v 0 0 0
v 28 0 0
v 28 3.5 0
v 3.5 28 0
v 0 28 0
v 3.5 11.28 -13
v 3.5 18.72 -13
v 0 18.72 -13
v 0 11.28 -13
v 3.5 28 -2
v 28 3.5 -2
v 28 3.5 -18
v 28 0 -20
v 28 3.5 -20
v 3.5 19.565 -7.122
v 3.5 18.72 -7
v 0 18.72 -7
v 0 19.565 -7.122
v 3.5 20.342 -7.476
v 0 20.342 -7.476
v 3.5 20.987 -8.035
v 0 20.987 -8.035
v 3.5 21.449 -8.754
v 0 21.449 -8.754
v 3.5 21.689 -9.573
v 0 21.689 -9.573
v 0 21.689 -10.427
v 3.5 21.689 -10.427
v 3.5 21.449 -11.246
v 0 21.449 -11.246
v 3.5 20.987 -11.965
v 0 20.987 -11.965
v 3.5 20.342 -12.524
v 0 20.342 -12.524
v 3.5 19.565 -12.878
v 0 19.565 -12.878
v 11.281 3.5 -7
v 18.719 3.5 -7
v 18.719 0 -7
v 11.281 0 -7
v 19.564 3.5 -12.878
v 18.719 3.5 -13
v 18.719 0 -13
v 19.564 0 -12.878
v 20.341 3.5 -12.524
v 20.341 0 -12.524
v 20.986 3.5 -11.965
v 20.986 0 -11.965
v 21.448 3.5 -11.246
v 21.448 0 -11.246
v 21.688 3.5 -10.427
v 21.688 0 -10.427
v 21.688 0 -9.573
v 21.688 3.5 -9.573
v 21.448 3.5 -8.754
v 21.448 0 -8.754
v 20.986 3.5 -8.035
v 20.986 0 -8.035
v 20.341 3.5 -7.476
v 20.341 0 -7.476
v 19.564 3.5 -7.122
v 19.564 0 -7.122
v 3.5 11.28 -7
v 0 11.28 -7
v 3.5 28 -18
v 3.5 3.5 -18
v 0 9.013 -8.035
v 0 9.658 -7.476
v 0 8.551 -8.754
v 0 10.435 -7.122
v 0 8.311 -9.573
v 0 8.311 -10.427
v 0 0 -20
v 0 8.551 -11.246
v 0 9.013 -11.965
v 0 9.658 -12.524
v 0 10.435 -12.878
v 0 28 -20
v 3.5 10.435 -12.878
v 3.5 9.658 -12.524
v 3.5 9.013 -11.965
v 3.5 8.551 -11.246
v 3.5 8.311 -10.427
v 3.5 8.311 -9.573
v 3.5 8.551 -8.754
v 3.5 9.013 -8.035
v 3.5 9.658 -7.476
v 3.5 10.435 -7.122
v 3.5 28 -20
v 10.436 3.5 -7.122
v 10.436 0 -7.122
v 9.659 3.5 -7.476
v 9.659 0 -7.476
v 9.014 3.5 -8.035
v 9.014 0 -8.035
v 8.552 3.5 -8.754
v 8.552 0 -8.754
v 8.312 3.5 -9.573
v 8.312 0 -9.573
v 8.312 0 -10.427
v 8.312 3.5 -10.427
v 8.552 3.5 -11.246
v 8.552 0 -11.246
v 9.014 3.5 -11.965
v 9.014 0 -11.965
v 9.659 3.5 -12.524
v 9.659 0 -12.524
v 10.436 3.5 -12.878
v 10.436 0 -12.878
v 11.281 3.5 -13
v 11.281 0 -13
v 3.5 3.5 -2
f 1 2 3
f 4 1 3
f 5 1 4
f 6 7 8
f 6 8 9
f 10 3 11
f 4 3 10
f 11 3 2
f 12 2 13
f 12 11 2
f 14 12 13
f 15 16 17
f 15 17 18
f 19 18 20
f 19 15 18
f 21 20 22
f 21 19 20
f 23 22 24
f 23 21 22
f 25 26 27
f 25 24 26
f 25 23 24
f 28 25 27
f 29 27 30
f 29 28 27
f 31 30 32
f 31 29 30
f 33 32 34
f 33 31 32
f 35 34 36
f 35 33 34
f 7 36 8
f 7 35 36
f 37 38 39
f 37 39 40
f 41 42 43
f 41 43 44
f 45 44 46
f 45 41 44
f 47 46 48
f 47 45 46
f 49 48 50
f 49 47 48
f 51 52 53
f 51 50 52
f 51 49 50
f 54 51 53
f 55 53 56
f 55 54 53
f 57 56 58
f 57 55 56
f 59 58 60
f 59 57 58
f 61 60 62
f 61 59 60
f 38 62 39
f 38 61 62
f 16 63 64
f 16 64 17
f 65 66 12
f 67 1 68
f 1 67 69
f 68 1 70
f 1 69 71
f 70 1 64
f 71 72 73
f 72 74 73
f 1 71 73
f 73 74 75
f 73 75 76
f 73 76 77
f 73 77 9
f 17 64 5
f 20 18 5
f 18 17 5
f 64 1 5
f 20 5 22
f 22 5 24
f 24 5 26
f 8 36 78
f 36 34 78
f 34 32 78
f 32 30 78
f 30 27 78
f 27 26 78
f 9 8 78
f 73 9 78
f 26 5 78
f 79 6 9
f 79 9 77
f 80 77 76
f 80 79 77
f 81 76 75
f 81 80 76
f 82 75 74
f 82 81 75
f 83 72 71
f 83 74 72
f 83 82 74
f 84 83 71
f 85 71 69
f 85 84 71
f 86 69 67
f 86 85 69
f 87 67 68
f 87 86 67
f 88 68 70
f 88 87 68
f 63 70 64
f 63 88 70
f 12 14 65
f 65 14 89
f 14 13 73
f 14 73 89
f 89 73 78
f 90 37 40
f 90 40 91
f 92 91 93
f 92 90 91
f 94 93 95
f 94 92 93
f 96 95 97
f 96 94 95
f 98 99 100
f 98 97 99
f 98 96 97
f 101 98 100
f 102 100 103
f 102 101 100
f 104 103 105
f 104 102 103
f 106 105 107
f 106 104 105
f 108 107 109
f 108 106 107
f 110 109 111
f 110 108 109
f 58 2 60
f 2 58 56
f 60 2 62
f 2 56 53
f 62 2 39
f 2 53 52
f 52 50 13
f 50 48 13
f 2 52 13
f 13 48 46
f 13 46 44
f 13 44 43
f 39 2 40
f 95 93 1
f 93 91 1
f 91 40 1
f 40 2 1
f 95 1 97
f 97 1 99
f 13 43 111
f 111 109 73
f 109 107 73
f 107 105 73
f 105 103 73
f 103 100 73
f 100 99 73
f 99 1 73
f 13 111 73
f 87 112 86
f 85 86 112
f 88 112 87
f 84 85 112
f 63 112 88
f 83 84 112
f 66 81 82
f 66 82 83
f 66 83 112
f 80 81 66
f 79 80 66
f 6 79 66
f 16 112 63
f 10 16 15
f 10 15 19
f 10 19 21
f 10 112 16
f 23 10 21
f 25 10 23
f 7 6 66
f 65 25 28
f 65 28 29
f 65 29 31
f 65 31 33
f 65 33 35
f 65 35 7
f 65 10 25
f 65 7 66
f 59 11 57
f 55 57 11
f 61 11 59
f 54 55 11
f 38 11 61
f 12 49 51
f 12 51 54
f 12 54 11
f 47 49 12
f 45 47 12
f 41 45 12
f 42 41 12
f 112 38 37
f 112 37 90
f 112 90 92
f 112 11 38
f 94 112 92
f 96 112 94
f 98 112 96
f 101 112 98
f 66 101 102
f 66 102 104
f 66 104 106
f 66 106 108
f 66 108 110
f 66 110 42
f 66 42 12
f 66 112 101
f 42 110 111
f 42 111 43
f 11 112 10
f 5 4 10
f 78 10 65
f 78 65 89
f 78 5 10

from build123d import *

# Parameters (mm, degrees)
SKETCH1_W           = 20
SKETCH1_H           = 28
BOSS_EXTRUDE1_DEPTH = 3.5
SKETCH2_W           = 20
SKETCH2_H           = 3.5
BOSS_EXTRUDE2_DEPTH = 24.5
BOSS_EXTRUDE3_DEPTH = 2
BOSS_EXTRUDE4_DEPTH = 2
CUT_EXTRUDE1_DEPTH  = 43.240383521
CUT_EXTRUDE2_DEPTH  = 43.240383521


with BuildPart() as part:
    # Sketch1 → Boss-Extrude1 (new body)
    with BuildSketch(Plane(origin=(0, 0, 0), x_dir=(0, 0, -1), z_dir=(1, 0, 0))):
        with Locations((10, 14)):
            Rectangle(SKETCH1_W, SKETCH1_H)
    extrude(amount=BOSS_EXTRUDE1_DEPTH)

    # Sketch2 → Boss-Extrude2 (add)
    with BuildSketch(Plane(origin=(3.5, 0, 0), x_dir=(0, 0, -1), z_dir=(1, 0, 0))):
        with Locations((10, 1.75)):
            Rectangle(SKETCH2_W, SKETCH2_H)
    extrude(amount=BOSS_EXTRUDE2_DEPTH)

    # Sketch3 → Boss-Extrude3 (add)
    with BuildSketch(Plane(origin=(0, 0, -20), x_dir=(-1, 0, 0), z_dir=(0, 0, -1))):
        Polygon((-28, 0), (-28, 3.5), (-3.5, 28), (0, 28), (0, 0), align=None)
    extrude(amount=-BOSS_EXTRUDE3_DEPTH)

    # Sketch4 → Boss-Extrude4 (add)
    with BuildSketch(Plane.XY):
        Polygon((3.5, 28), (0, 28), (0, 0), (28, 0), (28, 3.5), align=None)
    extrude(amount=-BOSS_EXTRUDE4_DEPTH)

    # Sketch5 → Cut-Extrude1 (cut, through all)
    with BuildSketch(Plane(origin=(0, 3.5, 0), x_dir=(1, 0, 0), z_dir=(0, 1, 0))):
        with BuildLine():
            Line((18.718782713, 7), (11.281217287, 7))
            ThreePointArc((11.281217287, 7), (8.281217287, 10), (11.281217287, 13))
            Line((11.281217287, 13), (18.718782713, 13))
            ThreePointArc((18.718782713, 13), (21.718782713, 10), (18.718782713, 7))
        make_face()
    extrude(amount=-CUT_EXTRUDE1_DEPTH, mode=Mode.SUBTRACT)

    # Sketch6 → Cut-Extrude2 (cut, through all)
    with BuildSketch(Plane(origin=(3.5, 0, 0), x_dir=(0, 0, -1), z_dir=(1, 0, 0))):
        with BuildLine():
            Line((7, 11.28), (7, 18.72))
            ThreePointArc((7, 18.72), (10, 21.72), (13, 18.72))
            Line((13, 18.72), (13, 11.28))
            ThreePointArc((13, 11.28), (10, 8.28), (7, 11.28))
        make_face()
    extrude(amount=-CUT_EXTRUDE2_DEPTH, mode=Mode.SUBTRACT)


solid = part.part
